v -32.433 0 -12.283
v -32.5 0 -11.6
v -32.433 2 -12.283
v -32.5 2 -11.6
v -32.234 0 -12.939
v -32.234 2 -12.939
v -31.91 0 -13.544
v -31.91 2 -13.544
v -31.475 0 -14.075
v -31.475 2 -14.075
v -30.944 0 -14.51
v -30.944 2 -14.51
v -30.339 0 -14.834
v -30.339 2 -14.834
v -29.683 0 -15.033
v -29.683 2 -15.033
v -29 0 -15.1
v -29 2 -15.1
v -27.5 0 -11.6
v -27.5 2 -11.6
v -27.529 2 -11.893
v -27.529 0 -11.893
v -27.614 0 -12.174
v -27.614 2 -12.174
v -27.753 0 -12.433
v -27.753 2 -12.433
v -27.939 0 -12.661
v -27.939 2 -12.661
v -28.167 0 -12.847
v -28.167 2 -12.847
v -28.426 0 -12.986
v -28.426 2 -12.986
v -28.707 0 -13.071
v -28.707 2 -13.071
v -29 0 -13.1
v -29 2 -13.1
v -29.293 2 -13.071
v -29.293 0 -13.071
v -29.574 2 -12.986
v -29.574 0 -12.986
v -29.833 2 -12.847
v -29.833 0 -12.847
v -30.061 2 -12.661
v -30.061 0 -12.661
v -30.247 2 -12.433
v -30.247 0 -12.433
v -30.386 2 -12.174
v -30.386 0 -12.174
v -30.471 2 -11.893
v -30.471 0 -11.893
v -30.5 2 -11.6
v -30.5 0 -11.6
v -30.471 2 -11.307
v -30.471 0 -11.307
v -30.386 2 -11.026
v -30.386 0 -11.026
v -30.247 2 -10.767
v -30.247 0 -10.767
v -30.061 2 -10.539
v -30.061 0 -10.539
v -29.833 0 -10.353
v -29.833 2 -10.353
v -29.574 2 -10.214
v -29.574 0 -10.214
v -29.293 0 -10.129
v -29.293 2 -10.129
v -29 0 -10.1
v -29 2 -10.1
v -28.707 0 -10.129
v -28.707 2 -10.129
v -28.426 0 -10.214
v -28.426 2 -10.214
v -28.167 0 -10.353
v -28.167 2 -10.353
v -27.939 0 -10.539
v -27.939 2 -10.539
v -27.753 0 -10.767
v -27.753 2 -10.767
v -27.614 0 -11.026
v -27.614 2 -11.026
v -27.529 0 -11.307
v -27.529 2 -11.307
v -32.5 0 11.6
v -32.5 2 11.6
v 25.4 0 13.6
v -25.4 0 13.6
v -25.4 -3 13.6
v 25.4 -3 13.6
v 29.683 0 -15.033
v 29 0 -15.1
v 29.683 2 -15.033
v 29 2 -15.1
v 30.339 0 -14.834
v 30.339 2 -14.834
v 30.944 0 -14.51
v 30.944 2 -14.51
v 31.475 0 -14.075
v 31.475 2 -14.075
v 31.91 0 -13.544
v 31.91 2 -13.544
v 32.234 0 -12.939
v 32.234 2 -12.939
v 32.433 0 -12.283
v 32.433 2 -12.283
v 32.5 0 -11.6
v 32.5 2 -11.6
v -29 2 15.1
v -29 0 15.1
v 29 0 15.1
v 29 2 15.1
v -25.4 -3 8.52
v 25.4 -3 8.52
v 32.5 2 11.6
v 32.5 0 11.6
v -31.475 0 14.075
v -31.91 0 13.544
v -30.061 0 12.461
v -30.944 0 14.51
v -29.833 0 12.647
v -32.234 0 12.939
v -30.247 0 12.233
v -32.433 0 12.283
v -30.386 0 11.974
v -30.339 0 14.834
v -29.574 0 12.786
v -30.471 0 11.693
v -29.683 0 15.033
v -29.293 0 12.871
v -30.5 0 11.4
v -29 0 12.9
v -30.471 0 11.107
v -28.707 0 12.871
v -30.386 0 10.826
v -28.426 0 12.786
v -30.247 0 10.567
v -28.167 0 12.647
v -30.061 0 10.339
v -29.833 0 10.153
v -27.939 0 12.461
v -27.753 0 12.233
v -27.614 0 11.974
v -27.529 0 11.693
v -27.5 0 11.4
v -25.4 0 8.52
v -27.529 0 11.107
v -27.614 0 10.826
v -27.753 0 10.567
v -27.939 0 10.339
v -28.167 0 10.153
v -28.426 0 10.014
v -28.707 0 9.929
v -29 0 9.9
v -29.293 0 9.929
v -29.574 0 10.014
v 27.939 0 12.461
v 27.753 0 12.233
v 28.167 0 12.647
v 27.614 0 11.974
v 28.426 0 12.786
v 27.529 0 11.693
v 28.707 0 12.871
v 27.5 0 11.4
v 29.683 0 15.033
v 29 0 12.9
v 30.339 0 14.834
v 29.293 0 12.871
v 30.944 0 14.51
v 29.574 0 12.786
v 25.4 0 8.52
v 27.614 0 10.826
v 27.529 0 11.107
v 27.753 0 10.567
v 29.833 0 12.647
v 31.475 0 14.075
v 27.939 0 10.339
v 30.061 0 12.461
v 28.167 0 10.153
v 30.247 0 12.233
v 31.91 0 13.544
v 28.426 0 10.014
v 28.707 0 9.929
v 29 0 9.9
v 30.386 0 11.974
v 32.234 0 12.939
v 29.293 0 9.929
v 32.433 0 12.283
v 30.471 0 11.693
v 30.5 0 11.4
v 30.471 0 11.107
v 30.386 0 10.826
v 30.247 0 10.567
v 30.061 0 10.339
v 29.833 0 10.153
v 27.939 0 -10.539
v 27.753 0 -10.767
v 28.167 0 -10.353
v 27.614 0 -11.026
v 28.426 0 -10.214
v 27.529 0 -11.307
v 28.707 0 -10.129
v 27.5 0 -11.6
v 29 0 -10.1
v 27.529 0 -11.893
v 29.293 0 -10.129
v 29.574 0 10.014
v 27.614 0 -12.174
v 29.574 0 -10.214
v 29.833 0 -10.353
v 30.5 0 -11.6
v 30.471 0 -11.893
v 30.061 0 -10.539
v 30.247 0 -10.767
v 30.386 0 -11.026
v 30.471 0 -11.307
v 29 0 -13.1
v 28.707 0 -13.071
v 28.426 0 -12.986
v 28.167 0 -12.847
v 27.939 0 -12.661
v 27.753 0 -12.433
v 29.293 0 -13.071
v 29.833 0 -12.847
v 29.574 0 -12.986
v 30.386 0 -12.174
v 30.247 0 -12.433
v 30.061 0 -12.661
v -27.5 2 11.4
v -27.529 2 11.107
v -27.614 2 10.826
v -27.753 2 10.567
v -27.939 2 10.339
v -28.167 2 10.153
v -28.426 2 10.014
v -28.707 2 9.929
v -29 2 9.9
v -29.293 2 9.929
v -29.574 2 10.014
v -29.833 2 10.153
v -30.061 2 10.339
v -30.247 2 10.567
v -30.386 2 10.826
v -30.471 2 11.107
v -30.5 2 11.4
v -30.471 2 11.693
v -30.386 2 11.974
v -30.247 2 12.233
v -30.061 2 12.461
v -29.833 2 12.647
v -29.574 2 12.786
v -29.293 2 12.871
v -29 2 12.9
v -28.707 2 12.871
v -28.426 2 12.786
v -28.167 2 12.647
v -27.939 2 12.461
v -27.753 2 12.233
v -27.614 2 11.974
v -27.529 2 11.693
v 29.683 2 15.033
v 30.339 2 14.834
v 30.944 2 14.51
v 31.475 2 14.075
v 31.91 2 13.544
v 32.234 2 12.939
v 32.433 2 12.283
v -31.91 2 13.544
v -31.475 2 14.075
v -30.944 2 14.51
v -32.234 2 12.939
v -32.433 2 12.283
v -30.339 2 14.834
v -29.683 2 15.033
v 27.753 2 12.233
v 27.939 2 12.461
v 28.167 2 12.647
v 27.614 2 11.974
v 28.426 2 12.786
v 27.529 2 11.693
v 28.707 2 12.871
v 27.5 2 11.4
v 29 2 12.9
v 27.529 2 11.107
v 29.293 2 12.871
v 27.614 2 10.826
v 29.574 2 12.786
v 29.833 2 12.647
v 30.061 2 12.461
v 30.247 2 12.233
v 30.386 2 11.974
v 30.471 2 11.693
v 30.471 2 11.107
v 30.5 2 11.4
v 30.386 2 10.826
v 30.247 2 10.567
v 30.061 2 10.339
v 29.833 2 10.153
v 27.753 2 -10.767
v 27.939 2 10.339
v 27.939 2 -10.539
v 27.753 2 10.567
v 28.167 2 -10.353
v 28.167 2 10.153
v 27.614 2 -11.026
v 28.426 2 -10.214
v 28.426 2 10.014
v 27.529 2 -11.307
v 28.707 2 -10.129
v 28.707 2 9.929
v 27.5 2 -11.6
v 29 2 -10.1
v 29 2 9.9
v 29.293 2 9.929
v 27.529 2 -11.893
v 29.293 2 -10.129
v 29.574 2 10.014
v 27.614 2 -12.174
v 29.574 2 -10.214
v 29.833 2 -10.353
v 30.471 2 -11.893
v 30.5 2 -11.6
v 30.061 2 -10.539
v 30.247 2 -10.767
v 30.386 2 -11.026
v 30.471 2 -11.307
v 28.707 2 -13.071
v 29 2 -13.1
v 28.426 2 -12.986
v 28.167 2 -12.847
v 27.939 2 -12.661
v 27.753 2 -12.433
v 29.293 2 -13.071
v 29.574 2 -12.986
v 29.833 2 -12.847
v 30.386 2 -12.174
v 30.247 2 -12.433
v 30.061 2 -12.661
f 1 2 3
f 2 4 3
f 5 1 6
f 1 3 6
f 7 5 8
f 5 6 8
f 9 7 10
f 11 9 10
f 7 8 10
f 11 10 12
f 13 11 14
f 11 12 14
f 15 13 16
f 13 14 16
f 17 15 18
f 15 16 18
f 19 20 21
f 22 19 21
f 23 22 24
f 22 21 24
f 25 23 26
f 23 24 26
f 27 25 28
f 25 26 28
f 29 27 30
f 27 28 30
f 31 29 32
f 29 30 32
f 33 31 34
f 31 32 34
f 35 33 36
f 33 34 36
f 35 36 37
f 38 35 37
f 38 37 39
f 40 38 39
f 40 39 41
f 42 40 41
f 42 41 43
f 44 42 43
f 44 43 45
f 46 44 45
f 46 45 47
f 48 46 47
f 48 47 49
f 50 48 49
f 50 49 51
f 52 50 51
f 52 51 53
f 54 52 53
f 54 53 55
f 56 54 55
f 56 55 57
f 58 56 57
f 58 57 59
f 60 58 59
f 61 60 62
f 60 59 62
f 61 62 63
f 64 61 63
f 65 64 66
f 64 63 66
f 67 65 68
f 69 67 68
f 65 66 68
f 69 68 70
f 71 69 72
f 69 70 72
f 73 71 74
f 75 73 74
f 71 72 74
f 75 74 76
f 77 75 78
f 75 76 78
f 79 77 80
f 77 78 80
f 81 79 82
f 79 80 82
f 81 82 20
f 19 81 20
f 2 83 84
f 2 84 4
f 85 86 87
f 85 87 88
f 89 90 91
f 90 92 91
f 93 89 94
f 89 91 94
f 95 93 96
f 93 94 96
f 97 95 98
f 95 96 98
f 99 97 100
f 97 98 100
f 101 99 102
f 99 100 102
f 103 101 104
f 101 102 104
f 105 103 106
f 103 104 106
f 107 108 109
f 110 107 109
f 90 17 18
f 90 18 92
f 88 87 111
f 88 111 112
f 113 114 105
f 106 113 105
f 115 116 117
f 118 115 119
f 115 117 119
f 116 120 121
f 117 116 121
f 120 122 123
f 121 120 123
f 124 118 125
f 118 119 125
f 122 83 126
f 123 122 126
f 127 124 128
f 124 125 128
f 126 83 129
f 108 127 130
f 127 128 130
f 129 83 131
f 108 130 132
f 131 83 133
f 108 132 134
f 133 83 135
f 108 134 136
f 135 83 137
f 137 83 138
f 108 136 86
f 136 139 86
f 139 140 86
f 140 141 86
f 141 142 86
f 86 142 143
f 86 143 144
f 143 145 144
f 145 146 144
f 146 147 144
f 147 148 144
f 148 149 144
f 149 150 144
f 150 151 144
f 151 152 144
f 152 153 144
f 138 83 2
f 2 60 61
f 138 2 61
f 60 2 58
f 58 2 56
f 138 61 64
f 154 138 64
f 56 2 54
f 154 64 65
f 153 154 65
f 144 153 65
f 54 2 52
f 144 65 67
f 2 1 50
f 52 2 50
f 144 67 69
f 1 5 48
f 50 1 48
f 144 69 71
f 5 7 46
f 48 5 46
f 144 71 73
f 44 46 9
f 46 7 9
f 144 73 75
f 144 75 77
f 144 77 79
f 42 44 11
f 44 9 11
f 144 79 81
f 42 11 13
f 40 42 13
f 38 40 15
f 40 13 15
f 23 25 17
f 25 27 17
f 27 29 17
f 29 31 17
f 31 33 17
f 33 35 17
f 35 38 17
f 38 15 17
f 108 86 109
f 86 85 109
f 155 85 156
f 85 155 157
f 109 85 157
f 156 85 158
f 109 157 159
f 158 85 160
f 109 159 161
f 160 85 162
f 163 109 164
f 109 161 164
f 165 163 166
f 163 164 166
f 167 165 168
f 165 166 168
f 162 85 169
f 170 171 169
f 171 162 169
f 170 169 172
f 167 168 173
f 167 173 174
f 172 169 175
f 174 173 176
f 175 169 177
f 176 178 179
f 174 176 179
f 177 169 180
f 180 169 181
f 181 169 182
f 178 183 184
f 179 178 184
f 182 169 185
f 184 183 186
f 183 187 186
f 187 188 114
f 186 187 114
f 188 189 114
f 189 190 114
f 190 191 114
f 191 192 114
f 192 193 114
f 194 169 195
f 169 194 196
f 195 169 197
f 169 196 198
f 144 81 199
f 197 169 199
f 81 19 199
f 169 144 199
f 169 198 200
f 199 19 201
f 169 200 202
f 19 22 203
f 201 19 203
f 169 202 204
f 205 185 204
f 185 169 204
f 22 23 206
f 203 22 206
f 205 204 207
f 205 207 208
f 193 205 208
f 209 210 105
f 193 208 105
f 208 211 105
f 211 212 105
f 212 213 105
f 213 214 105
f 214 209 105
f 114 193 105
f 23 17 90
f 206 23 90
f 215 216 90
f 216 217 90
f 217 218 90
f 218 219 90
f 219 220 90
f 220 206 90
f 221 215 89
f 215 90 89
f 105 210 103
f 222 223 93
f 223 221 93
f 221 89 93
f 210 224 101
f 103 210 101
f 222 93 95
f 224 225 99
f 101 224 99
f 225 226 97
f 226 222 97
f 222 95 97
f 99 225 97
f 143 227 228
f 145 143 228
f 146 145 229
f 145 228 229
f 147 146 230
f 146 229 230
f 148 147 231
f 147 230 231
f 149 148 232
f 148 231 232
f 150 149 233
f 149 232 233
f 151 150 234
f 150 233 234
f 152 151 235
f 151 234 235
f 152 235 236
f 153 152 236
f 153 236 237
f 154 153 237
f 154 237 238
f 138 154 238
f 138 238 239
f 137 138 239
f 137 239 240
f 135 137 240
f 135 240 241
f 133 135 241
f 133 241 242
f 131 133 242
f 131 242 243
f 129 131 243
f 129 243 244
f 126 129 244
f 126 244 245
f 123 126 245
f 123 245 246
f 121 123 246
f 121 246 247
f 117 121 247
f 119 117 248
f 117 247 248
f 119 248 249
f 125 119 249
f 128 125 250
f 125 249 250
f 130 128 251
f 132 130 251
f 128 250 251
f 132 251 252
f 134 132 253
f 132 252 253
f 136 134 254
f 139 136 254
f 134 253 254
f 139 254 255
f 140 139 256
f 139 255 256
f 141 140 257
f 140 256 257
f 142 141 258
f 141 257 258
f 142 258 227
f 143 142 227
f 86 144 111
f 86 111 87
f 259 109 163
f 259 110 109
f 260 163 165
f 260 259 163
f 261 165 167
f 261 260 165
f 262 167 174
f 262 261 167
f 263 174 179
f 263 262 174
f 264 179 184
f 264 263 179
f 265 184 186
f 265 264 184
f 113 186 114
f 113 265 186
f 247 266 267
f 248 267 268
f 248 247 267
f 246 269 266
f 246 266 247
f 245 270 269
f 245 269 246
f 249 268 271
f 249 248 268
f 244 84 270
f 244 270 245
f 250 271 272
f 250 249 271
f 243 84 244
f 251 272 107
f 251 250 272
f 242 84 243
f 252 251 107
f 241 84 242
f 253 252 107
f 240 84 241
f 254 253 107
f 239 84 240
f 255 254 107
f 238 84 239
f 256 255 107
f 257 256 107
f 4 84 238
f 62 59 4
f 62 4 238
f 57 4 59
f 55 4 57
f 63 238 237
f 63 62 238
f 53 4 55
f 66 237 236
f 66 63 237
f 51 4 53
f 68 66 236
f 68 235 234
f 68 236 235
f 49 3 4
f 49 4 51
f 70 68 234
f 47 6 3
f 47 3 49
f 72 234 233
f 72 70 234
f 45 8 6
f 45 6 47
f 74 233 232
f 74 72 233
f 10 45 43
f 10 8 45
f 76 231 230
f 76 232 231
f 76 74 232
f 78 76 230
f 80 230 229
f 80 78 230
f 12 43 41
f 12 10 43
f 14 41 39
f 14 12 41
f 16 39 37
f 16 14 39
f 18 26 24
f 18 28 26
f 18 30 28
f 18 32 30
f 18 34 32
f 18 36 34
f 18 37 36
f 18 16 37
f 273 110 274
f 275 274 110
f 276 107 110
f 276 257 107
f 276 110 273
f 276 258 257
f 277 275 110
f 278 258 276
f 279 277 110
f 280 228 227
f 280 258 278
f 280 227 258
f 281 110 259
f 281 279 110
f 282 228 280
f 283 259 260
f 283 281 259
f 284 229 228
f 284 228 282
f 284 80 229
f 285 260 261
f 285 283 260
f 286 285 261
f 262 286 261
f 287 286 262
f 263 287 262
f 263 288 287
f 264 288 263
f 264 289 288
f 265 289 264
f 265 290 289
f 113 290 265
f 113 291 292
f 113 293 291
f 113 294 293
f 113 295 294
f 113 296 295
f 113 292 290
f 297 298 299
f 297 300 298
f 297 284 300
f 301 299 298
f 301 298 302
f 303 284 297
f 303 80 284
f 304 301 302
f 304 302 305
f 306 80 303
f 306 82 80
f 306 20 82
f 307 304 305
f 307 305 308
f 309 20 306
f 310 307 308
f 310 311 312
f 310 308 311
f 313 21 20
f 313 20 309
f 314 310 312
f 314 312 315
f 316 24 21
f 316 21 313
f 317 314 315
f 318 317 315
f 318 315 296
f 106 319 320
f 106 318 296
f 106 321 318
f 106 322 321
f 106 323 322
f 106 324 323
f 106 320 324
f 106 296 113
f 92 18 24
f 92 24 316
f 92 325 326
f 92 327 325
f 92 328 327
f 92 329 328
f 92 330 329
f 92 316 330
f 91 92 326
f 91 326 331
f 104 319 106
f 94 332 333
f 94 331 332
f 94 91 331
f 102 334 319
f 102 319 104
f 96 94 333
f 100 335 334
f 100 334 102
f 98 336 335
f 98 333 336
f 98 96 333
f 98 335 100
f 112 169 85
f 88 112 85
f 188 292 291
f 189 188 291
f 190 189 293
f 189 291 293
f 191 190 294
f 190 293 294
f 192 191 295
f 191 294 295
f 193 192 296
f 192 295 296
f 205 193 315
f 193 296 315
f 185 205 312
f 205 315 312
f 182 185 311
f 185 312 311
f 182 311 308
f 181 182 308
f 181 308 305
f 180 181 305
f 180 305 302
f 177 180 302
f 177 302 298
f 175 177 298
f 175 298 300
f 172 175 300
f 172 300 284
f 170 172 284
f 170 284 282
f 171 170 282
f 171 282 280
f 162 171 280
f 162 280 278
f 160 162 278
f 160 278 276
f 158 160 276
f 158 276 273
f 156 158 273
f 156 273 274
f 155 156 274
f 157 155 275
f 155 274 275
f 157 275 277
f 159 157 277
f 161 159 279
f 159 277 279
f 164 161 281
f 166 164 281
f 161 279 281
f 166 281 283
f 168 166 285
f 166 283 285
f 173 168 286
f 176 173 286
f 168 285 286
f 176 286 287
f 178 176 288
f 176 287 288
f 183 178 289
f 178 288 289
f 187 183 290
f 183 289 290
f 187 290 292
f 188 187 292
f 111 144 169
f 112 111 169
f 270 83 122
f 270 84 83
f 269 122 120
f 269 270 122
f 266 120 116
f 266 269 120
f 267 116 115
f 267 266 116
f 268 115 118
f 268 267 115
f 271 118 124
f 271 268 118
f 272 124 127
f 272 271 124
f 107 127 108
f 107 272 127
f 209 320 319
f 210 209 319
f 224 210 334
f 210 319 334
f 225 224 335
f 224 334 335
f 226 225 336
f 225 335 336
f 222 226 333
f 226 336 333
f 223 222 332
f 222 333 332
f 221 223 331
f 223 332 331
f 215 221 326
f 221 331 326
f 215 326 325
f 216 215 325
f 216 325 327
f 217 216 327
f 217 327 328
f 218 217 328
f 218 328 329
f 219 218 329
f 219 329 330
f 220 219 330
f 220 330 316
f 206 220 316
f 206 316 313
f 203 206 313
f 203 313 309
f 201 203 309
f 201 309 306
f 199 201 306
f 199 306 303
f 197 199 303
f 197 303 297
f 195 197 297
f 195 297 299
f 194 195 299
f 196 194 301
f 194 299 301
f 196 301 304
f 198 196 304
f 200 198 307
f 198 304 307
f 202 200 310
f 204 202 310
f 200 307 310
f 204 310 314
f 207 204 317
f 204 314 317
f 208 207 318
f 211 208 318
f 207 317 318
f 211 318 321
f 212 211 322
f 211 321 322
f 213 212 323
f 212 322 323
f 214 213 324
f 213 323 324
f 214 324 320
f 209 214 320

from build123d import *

# Parameters (mm, degrees)
SKETCH_1_W          = 65
SKETCH_1_H          = 30.2
EXTRUDE_1_DEPTH     = 2
SKETCH_2_R          = 1.5
CUT_EXTRUDE_1_DEPTH = 3
FILLET_1_R          = 3.5
SKETCH_4_W          = 50.8
SKETCH_4_H          = 5.08
EXTRUDE_2_DEPTH     = 3


with BuildPart() as part:
    # 草圖1 → 填料-伸長1 (new body)
    with BuildSketch(Plane(origin=(0, 0, 0), x_dir=(1, 0, 0), z_dir=(0, 1, 0))):
        Rectangle(SKETCH_1_W, SKETCH_1_H)
    extrude(amount=EXTRUDE_1_DEPTH)

    # 草圖2 → 除料-伸長1 (cut, through all)
    with BuildSketch(Plane(origin=(0, 2, 0), x_dir=(1, 0, 0), z_dir=(0, 1, 0))):
        with Locations((-29, 11.6)):
            Circle(SKETCH_2_R)
        with Locations((-29, -11.4)):
            Circle(SKETCH_2_R)
        with Locations((29, -11.4)):
            Circle(SKETCH_2_R)
        with Locations((29, 11.6)):
            Circle(SKETCH_2_R)
    extrude(amount=-CUT_EXTRUDE_1_DEPTH, mode=Mode.SUBTRACT)

    # 圓角1
    fillet_1_edges = [part.edges().sort_by_distance(p)[0] for p in [
        (32.5, 1, 15.1),
        (-32.5, 1, 15.1),
        (-32.5, 1, -15.1),
        (32.5, 1, -15.1),
    ]]
    fillet(fillet_1_edges, radius=FILLET_1_R)

    # 草圖4 → 填料-伸長2 (add)
    with BuildSketch(Plane.XZ):
        with Locations((0, 11.06)):
            Rectangle(SKETCH_4_W, SKETCH_4_H)
    extrude(amount=EXTRUDE_2_DEPTH)


solid = part.part
